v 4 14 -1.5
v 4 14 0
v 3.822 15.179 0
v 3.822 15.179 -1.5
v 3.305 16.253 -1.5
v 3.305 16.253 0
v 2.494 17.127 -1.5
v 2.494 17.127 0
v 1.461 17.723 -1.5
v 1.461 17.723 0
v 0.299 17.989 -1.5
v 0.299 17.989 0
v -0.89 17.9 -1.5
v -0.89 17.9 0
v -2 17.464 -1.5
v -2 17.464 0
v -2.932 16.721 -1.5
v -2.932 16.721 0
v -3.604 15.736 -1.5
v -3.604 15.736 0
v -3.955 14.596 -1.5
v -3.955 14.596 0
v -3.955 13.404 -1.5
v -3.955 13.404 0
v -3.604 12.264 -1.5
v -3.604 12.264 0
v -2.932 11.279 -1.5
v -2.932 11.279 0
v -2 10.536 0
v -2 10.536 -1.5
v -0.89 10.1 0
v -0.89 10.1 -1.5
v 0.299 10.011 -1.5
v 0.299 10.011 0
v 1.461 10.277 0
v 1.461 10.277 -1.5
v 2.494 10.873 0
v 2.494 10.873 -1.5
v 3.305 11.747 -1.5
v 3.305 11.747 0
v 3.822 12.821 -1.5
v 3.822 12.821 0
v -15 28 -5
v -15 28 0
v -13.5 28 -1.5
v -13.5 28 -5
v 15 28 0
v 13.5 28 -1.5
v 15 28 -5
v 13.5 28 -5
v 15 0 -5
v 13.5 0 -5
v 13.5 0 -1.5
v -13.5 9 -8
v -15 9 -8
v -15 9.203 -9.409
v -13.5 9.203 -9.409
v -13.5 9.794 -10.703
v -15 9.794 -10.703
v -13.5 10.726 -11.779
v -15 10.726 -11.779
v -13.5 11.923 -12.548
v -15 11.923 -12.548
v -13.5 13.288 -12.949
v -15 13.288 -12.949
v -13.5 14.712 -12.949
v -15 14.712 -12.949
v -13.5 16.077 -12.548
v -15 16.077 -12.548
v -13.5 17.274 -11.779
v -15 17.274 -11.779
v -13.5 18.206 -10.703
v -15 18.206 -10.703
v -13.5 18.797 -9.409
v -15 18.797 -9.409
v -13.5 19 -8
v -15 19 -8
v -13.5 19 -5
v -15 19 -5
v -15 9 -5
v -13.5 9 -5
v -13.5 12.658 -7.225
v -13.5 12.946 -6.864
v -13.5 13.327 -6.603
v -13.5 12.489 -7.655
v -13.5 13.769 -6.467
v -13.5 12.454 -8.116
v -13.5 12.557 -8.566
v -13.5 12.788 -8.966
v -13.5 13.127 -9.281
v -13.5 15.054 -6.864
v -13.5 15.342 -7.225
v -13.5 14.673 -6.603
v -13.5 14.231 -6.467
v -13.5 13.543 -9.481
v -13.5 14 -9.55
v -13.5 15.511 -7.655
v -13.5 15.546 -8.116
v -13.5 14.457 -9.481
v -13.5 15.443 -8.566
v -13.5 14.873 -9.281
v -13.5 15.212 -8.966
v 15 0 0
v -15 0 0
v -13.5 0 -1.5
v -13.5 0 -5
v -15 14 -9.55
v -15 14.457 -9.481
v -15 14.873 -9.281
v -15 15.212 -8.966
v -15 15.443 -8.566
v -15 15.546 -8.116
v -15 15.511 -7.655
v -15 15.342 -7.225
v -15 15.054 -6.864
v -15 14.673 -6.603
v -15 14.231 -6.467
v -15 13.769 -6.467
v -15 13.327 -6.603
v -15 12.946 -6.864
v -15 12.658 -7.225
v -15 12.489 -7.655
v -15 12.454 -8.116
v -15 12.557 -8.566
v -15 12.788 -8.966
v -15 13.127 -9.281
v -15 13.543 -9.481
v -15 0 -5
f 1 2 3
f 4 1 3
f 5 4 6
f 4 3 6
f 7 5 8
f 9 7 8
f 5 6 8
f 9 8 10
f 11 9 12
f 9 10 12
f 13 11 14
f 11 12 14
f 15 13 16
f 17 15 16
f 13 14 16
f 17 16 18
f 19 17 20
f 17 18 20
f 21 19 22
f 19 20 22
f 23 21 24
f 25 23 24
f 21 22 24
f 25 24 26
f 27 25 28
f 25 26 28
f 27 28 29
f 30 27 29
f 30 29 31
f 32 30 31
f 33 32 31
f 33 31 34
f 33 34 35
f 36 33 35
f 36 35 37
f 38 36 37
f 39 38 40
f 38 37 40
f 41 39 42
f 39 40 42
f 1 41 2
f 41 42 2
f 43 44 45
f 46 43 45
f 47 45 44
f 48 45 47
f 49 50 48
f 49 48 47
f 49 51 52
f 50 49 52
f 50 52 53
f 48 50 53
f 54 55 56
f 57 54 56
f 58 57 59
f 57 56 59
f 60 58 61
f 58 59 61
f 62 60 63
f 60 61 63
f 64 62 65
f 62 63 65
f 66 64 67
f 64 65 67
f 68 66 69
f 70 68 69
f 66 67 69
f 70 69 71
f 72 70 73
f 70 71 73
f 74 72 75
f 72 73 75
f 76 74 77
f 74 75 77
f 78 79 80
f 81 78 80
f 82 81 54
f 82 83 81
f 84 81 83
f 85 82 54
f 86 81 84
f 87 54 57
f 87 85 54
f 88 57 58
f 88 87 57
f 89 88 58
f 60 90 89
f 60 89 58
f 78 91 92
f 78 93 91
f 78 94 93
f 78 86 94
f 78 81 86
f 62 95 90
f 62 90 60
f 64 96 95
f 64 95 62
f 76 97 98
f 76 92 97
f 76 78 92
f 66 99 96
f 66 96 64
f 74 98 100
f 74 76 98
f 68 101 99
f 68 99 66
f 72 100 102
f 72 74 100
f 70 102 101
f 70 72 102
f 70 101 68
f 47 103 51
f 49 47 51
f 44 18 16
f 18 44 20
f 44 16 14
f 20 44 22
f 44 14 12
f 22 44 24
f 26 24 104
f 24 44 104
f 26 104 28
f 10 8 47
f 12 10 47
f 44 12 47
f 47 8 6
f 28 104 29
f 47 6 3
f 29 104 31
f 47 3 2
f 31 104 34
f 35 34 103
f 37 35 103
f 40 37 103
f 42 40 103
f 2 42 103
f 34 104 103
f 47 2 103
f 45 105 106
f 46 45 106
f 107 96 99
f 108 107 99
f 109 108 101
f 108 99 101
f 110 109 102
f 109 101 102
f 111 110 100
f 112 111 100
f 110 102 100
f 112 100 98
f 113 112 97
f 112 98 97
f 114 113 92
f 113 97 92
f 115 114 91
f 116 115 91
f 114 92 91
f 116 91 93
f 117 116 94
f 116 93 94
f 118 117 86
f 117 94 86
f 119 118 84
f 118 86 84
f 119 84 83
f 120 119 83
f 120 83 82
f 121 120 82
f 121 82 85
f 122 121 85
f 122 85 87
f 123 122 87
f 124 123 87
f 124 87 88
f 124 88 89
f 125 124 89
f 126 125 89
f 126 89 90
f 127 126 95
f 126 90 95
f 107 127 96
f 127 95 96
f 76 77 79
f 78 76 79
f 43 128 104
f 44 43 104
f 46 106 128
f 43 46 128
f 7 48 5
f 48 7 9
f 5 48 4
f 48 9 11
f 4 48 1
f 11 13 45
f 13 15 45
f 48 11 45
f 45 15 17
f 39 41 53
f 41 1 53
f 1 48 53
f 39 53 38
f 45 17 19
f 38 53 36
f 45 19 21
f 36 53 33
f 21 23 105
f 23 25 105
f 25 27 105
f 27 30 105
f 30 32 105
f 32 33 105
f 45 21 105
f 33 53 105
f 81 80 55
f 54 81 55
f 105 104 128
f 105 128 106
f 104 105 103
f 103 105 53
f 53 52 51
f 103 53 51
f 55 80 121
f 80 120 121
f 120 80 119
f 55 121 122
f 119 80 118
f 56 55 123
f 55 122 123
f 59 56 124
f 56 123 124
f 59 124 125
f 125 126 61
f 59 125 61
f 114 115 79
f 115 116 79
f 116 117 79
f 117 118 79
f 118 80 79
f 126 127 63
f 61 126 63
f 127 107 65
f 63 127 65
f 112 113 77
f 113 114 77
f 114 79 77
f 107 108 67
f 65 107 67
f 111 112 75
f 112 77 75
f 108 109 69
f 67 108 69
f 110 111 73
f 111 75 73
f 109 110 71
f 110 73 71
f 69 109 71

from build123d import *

# Parameters (mm, degrees)
EXTRUDE_1_DEPTH     = 28
EXTRUDE_2_DEPTH     = 1.5
SKETCH_3_R          = 1.55
CUT_EXTRUDE_1_DEPTH = 1.5
SKETCH_4_R          = 4
CUT_EXTRUDE_2_DEPTH = 1.5


with BuildPart() as part:
    # 草图1 → 凸台-拉伸1 (new body)
    with BuildSketch(Plane(origin=(0, 0, 0), x_dir=(1, 0, 0), z_dir=(0, 1, 0))):
        Polygon((-15, 0), (15, 0), (15, 5), (13.5, 5), (13.5, 1.5), (-13.5, 1.5), (-13.5, 5), (-15, 5), align=None)
    extrude(amount=EXTRUDE_1_DEPTH)

    # 草图4 → 切除-拉伸2 (cut)
    with BuildSketch(Plane.XY):
        with Locations((0, 14)):
            Circle(SKETCH_4_R)
    extrude(amount=-CUT_EXTRUDE_2_DEPTH, mode=Mode.SUBTRACT)


with BuildPart() as body_2:
    # 草图2 → 凸台-拉伸2 (new body)
    with BuildSketch(Plane.ZY.offset(15)):
        with BuildLine():
            Line((-8, 19), (-5, 19))
            Line((-5, 19), (-5, 9))
            Line((-5, 9), (-8, 9))
            ThreePointArc((-8, 9), (-13, 14), (-8, 19))
        make_face()
    extrude(amount=-EXTRUDE_2_DEPTH)

    # 草图3 → 切除-拉伸1 (cut)
    with BuildSketch(Plane(origin=(-13.5, 0, 0), x_dir=(0, 0, -1), z_dir=(1, 0, 0))):
        with Locations((8, 14)):
            Circle(SKETCH_3_R)
    extrude(amount=-CUT_EXTRUDE_1_DEPTH, mode=Mode.SUBTRACT)


solid = Compound([part.part, body_2.part])
